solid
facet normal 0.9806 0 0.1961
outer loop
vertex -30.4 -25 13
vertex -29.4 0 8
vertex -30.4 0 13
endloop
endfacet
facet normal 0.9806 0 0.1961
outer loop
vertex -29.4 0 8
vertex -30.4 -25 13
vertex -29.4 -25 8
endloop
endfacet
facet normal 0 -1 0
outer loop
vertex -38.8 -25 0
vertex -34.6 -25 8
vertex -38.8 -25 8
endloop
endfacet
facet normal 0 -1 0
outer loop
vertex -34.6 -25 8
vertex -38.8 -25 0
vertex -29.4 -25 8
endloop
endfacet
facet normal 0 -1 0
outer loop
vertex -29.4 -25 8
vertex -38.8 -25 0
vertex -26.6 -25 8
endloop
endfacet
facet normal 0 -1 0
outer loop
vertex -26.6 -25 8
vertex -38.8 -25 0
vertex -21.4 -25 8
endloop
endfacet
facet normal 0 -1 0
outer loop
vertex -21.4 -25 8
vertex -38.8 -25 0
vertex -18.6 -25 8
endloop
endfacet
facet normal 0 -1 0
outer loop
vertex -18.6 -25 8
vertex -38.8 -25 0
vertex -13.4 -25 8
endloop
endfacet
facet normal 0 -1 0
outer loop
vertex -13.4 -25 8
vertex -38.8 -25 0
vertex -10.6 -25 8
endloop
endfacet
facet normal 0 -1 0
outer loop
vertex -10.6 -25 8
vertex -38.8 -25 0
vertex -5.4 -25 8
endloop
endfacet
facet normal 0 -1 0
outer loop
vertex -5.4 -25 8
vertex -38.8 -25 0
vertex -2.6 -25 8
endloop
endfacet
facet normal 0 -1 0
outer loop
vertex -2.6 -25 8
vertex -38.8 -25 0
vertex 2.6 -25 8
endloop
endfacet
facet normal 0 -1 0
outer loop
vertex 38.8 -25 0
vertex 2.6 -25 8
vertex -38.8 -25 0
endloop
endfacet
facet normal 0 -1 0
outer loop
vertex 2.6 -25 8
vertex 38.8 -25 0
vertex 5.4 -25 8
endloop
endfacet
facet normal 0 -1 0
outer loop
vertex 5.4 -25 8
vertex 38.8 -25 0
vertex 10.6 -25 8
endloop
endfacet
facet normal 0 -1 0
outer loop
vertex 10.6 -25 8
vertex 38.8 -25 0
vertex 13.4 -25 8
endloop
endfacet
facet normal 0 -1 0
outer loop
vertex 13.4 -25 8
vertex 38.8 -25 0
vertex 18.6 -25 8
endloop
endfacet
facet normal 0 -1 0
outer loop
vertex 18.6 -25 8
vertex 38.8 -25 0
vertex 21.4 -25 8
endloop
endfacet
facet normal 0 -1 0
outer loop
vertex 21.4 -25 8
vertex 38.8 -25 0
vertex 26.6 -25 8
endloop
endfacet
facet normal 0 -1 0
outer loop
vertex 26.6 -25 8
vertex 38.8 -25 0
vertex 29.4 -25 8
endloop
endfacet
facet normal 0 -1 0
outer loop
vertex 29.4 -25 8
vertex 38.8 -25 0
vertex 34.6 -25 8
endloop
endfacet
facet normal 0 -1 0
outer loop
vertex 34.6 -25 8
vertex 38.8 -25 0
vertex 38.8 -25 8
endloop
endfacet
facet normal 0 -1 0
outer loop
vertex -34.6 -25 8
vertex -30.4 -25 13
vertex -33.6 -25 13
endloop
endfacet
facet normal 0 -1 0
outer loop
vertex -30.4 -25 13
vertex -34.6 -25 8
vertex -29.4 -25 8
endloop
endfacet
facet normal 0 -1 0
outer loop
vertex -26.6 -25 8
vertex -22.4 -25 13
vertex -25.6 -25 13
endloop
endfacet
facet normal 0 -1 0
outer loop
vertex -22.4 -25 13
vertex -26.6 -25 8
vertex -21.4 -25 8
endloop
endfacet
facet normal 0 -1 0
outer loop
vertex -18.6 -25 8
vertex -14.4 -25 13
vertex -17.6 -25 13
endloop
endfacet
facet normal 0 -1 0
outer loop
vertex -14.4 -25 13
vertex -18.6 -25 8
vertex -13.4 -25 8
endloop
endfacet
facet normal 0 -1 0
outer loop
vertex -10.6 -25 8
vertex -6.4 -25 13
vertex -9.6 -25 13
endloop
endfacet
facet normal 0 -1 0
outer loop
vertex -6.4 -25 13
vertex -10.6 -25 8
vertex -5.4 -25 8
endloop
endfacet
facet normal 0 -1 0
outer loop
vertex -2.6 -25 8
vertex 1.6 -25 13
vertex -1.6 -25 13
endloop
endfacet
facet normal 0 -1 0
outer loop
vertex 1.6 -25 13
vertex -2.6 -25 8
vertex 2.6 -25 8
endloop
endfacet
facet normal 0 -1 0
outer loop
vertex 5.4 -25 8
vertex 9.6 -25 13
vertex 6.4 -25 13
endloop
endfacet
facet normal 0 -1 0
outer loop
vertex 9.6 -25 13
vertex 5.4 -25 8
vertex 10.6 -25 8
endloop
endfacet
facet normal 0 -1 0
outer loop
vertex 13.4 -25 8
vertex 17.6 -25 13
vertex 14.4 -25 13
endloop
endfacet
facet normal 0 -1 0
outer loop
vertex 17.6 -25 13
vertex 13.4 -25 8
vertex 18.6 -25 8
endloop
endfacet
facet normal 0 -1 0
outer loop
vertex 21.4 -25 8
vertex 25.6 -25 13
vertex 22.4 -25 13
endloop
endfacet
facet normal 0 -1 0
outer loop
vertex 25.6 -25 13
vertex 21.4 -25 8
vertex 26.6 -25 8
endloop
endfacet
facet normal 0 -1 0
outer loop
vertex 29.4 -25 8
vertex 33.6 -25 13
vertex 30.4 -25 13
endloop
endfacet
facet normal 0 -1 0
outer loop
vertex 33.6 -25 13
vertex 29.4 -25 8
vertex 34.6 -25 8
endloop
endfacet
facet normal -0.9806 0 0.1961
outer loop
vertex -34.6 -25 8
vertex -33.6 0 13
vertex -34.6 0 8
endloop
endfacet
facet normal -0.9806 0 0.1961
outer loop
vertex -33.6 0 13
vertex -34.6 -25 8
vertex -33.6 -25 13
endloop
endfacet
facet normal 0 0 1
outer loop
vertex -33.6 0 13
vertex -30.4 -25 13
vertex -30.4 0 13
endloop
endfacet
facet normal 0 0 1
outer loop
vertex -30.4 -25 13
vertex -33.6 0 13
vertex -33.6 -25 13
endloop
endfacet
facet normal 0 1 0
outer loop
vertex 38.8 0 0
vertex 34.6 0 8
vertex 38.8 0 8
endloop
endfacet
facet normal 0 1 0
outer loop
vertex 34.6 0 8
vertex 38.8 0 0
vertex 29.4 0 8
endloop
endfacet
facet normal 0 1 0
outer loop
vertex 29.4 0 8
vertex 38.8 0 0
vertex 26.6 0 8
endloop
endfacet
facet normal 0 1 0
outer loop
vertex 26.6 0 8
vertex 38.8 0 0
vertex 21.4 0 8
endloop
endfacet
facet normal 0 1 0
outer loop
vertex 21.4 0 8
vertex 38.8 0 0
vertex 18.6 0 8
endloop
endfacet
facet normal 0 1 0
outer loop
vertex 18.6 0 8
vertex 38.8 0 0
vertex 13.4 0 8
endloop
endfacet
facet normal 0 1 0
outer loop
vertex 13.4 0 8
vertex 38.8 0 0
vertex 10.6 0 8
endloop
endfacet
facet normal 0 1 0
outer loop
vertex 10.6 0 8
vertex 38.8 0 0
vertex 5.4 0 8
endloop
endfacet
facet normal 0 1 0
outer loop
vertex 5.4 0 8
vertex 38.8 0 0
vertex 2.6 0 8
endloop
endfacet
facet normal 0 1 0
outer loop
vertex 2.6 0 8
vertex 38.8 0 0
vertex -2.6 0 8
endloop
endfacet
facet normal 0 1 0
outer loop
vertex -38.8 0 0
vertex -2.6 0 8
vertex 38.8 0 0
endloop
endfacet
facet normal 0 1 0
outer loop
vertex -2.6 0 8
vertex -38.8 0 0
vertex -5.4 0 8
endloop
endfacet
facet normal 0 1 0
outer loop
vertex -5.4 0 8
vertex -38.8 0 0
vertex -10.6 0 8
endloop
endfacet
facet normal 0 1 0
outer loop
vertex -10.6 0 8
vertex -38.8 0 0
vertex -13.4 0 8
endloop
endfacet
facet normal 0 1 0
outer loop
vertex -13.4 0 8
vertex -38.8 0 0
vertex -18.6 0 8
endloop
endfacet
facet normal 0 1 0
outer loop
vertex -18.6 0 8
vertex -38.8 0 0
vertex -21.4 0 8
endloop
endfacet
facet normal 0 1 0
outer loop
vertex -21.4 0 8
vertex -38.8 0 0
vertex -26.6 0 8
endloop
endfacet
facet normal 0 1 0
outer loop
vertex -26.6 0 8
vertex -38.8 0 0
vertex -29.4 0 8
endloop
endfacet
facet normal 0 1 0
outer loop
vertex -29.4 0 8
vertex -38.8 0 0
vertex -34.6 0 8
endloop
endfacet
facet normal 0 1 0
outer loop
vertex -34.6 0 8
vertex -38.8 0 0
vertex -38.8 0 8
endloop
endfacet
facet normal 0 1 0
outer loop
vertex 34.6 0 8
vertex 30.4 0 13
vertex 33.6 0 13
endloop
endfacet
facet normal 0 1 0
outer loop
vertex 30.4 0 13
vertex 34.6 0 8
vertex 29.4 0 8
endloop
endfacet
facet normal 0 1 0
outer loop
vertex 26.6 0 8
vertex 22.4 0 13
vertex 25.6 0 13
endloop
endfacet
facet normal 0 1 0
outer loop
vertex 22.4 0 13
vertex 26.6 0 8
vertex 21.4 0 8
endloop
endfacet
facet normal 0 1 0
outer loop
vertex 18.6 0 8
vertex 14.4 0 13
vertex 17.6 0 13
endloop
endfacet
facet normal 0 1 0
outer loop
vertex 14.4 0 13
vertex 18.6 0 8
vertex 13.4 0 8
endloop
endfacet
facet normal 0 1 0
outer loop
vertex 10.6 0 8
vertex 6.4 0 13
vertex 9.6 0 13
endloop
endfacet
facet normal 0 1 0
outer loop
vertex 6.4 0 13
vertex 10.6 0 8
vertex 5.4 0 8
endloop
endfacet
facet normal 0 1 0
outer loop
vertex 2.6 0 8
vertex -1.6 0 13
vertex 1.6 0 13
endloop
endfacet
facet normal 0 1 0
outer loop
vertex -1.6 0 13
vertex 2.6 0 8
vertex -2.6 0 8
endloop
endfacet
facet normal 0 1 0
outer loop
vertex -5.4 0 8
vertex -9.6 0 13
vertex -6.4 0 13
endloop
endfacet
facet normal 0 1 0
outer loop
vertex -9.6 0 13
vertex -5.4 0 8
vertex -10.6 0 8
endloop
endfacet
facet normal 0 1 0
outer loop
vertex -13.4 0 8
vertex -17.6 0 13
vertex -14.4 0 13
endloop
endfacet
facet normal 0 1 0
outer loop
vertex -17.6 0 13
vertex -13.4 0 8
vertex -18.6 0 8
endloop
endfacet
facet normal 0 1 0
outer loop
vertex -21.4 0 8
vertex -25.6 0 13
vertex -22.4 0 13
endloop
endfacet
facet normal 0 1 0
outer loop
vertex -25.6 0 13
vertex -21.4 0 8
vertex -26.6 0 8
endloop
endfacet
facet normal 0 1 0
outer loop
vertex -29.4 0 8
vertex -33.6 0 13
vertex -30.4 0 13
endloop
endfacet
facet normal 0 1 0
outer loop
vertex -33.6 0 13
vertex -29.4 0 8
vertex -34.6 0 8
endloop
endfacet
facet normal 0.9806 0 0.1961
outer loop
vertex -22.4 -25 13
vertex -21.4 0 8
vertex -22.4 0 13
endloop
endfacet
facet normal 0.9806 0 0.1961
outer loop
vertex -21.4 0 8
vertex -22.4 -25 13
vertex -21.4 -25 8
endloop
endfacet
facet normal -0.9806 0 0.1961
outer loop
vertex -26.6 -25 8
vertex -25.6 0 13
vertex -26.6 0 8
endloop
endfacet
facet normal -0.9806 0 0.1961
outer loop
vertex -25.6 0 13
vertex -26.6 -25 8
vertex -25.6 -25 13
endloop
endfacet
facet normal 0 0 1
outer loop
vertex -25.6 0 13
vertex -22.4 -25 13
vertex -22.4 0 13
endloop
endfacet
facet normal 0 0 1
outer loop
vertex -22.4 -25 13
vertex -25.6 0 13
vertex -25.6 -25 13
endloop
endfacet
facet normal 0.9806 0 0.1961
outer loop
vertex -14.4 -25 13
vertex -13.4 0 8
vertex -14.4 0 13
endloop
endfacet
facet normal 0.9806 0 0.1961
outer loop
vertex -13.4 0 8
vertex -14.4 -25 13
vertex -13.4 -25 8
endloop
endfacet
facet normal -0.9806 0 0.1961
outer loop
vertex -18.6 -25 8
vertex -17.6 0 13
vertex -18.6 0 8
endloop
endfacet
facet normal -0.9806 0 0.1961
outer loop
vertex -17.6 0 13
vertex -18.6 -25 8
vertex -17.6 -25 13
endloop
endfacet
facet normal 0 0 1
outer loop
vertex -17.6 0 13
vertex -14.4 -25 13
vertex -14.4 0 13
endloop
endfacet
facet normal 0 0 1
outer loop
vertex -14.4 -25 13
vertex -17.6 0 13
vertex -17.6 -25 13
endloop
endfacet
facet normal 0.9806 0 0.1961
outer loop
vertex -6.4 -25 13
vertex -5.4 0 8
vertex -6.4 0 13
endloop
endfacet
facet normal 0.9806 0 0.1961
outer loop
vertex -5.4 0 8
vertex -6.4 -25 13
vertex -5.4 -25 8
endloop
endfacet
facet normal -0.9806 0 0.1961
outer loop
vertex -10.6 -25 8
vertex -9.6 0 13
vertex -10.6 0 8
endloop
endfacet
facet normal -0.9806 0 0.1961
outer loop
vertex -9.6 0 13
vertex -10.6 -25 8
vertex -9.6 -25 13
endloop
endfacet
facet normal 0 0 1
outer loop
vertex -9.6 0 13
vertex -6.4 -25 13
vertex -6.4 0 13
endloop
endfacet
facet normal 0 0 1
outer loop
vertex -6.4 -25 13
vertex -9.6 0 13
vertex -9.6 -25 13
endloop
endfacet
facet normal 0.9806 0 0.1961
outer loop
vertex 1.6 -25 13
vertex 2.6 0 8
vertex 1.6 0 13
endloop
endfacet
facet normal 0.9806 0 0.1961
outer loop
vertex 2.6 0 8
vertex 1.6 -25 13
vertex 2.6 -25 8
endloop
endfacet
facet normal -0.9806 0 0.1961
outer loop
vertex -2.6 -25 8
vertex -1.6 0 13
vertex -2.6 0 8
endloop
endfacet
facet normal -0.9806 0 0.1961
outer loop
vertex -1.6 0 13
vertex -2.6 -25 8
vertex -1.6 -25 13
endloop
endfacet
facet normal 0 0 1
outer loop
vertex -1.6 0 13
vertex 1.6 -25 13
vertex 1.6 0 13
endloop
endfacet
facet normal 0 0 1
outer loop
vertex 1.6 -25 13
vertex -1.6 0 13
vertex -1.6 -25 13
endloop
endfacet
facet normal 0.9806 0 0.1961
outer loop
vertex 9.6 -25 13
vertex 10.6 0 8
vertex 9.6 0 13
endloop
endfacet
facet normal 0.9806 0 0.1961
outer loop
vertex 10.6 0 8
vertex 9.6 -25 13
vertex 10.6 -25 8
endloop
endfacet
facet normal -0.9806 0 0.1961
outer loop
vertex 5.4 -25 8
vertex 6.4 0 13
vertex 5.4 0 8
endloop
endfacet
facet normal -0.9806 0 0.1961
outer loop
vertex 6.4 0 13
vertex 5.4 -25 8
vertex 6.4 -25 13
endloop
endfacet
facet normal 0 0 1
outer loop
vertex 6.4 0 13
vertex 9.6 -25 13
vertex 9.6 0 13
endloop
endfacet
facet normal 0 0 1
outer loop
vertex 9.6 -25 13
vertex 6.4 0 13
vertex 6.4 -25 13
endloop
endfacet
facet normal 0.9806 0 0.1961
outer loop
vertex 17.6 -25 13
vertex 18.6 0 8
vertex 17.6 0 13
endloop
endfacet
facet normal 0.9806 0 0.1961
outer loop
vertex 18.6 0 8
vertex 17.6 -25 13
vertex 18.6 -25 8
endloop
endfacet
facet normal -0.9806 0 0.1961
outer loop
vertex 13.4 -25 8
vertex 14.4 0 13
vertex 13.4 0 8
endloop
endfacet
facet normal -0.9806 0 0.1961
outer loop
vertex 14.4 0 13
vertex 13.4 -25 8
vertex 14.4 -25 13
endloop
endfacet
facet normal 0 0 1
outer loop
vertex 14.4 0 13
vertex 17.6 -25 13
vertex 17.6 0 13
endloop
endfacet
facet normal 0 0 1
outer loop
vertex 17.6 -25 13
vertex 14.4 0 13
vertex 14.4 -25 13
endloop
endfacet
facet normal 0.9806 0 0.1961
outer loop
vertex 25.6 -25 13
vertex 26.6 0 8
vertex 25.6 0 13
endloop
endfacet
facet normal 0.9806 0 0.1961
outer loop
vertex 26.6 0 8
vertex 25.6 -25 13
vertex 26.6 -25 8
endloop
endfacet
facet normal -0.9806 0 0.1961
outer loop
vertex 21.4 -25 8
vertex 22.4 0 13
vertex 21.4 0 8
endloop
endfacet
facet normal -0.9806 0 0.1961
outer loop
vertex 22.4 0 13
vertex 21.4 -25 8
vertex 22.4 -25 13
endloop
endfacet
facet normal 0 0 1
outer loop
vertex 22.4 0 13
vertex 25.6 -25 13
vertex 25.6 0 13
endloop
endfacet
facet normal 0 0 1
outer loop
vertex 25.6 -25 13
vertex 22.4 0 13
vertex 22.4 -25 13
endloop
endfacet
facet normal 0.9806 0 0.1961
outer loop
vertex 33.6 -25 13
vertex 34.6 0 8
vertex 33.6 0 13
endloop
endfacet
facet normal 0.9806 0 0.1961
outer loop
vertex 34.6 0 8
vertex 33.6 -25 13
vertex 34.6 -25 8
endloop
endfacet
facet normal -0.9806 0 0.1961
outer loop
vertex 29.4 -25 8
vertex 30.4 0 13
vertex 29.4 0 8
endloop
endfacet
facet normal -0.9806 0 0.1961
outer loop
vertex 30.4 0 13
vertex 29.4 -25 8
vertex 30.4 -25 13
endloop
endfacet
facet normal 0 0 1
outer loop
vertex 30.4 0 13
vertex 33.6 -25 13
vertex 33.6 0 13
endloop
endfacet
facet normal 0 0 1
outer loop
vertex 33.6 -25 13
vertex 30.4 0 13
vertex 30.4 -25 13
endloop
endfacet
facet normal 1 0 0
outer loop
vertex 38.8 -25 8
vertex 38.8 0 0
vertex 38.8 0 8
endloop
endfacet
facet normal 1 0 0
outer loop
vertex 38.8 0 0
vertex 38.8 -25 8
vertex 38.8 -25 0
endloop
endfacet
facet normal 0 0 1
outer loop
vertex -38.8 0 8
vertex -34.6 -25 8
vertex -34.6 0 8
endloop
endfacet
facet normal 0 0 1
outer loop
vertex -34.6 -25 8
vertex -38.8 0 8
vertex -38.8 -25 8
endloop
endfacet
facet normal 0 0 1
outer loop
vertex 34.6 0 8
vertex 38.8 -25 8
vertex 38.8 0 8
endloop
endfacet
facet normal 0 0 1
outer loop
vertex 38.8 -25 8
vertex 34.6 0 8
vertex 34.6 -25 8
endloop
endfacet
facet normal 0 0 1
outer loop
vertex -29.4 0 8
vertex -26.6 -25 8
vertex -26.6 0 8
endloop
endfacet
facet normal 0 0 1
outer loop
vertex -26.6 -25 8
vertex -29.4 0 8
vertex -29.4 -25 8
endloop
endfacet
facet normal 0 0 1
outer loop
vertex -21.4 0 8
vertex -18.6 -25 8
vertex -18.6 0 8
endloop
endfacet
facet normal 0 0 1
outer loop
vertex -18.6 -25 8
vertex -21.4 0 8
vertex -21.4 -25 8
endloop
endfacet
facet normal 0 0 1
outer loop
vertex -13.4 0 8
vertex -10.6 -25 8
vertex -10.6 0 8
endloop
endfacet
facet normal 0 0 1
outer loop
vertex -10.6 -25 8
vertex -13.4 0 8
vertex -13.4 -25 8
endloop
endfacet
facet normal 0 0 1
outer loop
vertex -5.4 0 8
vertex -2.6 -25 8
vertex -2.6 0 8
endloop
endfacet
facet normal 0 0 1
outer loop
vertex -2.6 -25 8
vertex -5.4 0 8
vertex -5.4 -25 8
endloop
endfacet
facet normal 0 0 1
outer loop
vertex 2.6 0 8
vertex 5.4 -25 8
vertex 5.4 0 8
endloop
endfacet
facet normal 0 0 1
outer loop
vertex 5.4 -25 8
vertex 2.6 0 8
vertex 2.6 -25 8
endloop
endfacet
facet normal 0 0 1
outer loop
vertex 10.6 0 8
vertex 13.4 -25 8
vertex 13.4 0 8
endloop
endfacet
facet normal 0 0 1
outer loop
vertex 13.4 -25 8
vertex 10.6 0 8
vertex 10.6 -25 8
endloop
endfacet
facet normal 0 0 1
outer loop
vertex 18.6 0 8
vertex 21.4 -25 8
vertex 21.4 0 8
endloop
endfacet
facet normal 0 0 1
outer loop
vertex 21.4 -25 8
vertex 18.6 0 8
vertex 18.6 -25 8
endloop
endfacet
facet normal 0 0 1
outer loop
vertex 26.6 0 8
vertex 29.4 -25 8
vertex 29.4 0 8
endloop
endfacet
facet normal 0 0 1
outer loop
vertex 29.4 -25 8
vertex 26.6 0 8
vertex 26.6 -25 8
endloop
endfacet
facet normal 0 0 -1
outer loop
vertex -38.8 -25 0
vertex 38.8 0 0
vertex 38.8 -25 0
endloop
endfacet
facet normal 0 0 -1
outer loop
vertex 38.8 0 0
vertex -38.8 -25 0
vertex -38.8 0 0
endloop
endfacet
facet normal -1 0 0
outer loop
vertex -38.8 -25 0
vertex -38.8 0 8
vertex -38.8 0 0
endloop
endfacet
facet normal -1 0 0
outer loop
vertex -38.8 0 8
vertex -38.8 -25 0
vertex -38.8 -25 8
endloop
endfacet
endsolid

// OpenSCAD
$fn = 32;

// ----------------------------------------------------------------------
// Toothed rack, 9 teeth
// 8 mm pitch, 5 mm teeth
// ----------------------------------------------------------------------

// --- parameters (mm) ---
bar_w = 25;     // bar width (Y)
bar_h = 8;      // bar height (Z)
teeth = 9;      // number of teeth
pitch = 8;      // tooth pitch
tooth_h = 5;    // tooth height above the bar
root_w = 5.6;   // tooth width at the root
crest_w = 3.2;  // tooth width at the crest

// --- derived feature positions (mm) ---
span = (teeth - 1) * pitch;  // = 64   distance between the outer teeth
bar_l = span + root_w + 8;   // = 77.6   bar length: teeth plus 4 mm at each end
tooth_x = -span / 2;         // = -32   X of the first tooth
height = bar_h + tooth_h;    // = 13   overall height
feature_centers = [
  [tooth_x + 0 * pitch, -bar_w / 2],
  [tooth_x + 1 * pitch, -bar_w / 2],
  [tooth_x + 2 * pitch, -bar_w / 2],
  [tooth_x + 3 * pitch, -bar_w / 2],
  [tooth_x + 4 * pitch, -bar_w / 2],
  [tooth_x + 5 * pitch, -bar_w / 2],
  [tooth_x + 6 * pitch, -bar_w / 2],
  [tooth_x + 7 * pitch, -bar_w / 2],
  [tooth_x + 8 * pitch, -bar_w / 2]
];   // tooth centre line, drives the tooth loop

// bar with a rack of teeth, one extruded trapezoium per centre
module rack_tooth() {
  linear_extrude(height = bar_w)
    polygon(points = [
      [0, 0],
      [root_w, 0],
      [root_w / 2 + crest_w / 2, tooth_h + 1],
      [root_w / 2 - crest_w / 2, tooth_h + 1]
    ]);
}

union() {
  translate([-bar_l / 2, -bar_w, 0]) cube([bar_l, bar_w, bar_h]);
  for (centre = feature_centers)
    translate([centre[0] - root_w / 2, 0, bar_h - 1]) rotate([90, 0, 0]) rack_tooth();
}
